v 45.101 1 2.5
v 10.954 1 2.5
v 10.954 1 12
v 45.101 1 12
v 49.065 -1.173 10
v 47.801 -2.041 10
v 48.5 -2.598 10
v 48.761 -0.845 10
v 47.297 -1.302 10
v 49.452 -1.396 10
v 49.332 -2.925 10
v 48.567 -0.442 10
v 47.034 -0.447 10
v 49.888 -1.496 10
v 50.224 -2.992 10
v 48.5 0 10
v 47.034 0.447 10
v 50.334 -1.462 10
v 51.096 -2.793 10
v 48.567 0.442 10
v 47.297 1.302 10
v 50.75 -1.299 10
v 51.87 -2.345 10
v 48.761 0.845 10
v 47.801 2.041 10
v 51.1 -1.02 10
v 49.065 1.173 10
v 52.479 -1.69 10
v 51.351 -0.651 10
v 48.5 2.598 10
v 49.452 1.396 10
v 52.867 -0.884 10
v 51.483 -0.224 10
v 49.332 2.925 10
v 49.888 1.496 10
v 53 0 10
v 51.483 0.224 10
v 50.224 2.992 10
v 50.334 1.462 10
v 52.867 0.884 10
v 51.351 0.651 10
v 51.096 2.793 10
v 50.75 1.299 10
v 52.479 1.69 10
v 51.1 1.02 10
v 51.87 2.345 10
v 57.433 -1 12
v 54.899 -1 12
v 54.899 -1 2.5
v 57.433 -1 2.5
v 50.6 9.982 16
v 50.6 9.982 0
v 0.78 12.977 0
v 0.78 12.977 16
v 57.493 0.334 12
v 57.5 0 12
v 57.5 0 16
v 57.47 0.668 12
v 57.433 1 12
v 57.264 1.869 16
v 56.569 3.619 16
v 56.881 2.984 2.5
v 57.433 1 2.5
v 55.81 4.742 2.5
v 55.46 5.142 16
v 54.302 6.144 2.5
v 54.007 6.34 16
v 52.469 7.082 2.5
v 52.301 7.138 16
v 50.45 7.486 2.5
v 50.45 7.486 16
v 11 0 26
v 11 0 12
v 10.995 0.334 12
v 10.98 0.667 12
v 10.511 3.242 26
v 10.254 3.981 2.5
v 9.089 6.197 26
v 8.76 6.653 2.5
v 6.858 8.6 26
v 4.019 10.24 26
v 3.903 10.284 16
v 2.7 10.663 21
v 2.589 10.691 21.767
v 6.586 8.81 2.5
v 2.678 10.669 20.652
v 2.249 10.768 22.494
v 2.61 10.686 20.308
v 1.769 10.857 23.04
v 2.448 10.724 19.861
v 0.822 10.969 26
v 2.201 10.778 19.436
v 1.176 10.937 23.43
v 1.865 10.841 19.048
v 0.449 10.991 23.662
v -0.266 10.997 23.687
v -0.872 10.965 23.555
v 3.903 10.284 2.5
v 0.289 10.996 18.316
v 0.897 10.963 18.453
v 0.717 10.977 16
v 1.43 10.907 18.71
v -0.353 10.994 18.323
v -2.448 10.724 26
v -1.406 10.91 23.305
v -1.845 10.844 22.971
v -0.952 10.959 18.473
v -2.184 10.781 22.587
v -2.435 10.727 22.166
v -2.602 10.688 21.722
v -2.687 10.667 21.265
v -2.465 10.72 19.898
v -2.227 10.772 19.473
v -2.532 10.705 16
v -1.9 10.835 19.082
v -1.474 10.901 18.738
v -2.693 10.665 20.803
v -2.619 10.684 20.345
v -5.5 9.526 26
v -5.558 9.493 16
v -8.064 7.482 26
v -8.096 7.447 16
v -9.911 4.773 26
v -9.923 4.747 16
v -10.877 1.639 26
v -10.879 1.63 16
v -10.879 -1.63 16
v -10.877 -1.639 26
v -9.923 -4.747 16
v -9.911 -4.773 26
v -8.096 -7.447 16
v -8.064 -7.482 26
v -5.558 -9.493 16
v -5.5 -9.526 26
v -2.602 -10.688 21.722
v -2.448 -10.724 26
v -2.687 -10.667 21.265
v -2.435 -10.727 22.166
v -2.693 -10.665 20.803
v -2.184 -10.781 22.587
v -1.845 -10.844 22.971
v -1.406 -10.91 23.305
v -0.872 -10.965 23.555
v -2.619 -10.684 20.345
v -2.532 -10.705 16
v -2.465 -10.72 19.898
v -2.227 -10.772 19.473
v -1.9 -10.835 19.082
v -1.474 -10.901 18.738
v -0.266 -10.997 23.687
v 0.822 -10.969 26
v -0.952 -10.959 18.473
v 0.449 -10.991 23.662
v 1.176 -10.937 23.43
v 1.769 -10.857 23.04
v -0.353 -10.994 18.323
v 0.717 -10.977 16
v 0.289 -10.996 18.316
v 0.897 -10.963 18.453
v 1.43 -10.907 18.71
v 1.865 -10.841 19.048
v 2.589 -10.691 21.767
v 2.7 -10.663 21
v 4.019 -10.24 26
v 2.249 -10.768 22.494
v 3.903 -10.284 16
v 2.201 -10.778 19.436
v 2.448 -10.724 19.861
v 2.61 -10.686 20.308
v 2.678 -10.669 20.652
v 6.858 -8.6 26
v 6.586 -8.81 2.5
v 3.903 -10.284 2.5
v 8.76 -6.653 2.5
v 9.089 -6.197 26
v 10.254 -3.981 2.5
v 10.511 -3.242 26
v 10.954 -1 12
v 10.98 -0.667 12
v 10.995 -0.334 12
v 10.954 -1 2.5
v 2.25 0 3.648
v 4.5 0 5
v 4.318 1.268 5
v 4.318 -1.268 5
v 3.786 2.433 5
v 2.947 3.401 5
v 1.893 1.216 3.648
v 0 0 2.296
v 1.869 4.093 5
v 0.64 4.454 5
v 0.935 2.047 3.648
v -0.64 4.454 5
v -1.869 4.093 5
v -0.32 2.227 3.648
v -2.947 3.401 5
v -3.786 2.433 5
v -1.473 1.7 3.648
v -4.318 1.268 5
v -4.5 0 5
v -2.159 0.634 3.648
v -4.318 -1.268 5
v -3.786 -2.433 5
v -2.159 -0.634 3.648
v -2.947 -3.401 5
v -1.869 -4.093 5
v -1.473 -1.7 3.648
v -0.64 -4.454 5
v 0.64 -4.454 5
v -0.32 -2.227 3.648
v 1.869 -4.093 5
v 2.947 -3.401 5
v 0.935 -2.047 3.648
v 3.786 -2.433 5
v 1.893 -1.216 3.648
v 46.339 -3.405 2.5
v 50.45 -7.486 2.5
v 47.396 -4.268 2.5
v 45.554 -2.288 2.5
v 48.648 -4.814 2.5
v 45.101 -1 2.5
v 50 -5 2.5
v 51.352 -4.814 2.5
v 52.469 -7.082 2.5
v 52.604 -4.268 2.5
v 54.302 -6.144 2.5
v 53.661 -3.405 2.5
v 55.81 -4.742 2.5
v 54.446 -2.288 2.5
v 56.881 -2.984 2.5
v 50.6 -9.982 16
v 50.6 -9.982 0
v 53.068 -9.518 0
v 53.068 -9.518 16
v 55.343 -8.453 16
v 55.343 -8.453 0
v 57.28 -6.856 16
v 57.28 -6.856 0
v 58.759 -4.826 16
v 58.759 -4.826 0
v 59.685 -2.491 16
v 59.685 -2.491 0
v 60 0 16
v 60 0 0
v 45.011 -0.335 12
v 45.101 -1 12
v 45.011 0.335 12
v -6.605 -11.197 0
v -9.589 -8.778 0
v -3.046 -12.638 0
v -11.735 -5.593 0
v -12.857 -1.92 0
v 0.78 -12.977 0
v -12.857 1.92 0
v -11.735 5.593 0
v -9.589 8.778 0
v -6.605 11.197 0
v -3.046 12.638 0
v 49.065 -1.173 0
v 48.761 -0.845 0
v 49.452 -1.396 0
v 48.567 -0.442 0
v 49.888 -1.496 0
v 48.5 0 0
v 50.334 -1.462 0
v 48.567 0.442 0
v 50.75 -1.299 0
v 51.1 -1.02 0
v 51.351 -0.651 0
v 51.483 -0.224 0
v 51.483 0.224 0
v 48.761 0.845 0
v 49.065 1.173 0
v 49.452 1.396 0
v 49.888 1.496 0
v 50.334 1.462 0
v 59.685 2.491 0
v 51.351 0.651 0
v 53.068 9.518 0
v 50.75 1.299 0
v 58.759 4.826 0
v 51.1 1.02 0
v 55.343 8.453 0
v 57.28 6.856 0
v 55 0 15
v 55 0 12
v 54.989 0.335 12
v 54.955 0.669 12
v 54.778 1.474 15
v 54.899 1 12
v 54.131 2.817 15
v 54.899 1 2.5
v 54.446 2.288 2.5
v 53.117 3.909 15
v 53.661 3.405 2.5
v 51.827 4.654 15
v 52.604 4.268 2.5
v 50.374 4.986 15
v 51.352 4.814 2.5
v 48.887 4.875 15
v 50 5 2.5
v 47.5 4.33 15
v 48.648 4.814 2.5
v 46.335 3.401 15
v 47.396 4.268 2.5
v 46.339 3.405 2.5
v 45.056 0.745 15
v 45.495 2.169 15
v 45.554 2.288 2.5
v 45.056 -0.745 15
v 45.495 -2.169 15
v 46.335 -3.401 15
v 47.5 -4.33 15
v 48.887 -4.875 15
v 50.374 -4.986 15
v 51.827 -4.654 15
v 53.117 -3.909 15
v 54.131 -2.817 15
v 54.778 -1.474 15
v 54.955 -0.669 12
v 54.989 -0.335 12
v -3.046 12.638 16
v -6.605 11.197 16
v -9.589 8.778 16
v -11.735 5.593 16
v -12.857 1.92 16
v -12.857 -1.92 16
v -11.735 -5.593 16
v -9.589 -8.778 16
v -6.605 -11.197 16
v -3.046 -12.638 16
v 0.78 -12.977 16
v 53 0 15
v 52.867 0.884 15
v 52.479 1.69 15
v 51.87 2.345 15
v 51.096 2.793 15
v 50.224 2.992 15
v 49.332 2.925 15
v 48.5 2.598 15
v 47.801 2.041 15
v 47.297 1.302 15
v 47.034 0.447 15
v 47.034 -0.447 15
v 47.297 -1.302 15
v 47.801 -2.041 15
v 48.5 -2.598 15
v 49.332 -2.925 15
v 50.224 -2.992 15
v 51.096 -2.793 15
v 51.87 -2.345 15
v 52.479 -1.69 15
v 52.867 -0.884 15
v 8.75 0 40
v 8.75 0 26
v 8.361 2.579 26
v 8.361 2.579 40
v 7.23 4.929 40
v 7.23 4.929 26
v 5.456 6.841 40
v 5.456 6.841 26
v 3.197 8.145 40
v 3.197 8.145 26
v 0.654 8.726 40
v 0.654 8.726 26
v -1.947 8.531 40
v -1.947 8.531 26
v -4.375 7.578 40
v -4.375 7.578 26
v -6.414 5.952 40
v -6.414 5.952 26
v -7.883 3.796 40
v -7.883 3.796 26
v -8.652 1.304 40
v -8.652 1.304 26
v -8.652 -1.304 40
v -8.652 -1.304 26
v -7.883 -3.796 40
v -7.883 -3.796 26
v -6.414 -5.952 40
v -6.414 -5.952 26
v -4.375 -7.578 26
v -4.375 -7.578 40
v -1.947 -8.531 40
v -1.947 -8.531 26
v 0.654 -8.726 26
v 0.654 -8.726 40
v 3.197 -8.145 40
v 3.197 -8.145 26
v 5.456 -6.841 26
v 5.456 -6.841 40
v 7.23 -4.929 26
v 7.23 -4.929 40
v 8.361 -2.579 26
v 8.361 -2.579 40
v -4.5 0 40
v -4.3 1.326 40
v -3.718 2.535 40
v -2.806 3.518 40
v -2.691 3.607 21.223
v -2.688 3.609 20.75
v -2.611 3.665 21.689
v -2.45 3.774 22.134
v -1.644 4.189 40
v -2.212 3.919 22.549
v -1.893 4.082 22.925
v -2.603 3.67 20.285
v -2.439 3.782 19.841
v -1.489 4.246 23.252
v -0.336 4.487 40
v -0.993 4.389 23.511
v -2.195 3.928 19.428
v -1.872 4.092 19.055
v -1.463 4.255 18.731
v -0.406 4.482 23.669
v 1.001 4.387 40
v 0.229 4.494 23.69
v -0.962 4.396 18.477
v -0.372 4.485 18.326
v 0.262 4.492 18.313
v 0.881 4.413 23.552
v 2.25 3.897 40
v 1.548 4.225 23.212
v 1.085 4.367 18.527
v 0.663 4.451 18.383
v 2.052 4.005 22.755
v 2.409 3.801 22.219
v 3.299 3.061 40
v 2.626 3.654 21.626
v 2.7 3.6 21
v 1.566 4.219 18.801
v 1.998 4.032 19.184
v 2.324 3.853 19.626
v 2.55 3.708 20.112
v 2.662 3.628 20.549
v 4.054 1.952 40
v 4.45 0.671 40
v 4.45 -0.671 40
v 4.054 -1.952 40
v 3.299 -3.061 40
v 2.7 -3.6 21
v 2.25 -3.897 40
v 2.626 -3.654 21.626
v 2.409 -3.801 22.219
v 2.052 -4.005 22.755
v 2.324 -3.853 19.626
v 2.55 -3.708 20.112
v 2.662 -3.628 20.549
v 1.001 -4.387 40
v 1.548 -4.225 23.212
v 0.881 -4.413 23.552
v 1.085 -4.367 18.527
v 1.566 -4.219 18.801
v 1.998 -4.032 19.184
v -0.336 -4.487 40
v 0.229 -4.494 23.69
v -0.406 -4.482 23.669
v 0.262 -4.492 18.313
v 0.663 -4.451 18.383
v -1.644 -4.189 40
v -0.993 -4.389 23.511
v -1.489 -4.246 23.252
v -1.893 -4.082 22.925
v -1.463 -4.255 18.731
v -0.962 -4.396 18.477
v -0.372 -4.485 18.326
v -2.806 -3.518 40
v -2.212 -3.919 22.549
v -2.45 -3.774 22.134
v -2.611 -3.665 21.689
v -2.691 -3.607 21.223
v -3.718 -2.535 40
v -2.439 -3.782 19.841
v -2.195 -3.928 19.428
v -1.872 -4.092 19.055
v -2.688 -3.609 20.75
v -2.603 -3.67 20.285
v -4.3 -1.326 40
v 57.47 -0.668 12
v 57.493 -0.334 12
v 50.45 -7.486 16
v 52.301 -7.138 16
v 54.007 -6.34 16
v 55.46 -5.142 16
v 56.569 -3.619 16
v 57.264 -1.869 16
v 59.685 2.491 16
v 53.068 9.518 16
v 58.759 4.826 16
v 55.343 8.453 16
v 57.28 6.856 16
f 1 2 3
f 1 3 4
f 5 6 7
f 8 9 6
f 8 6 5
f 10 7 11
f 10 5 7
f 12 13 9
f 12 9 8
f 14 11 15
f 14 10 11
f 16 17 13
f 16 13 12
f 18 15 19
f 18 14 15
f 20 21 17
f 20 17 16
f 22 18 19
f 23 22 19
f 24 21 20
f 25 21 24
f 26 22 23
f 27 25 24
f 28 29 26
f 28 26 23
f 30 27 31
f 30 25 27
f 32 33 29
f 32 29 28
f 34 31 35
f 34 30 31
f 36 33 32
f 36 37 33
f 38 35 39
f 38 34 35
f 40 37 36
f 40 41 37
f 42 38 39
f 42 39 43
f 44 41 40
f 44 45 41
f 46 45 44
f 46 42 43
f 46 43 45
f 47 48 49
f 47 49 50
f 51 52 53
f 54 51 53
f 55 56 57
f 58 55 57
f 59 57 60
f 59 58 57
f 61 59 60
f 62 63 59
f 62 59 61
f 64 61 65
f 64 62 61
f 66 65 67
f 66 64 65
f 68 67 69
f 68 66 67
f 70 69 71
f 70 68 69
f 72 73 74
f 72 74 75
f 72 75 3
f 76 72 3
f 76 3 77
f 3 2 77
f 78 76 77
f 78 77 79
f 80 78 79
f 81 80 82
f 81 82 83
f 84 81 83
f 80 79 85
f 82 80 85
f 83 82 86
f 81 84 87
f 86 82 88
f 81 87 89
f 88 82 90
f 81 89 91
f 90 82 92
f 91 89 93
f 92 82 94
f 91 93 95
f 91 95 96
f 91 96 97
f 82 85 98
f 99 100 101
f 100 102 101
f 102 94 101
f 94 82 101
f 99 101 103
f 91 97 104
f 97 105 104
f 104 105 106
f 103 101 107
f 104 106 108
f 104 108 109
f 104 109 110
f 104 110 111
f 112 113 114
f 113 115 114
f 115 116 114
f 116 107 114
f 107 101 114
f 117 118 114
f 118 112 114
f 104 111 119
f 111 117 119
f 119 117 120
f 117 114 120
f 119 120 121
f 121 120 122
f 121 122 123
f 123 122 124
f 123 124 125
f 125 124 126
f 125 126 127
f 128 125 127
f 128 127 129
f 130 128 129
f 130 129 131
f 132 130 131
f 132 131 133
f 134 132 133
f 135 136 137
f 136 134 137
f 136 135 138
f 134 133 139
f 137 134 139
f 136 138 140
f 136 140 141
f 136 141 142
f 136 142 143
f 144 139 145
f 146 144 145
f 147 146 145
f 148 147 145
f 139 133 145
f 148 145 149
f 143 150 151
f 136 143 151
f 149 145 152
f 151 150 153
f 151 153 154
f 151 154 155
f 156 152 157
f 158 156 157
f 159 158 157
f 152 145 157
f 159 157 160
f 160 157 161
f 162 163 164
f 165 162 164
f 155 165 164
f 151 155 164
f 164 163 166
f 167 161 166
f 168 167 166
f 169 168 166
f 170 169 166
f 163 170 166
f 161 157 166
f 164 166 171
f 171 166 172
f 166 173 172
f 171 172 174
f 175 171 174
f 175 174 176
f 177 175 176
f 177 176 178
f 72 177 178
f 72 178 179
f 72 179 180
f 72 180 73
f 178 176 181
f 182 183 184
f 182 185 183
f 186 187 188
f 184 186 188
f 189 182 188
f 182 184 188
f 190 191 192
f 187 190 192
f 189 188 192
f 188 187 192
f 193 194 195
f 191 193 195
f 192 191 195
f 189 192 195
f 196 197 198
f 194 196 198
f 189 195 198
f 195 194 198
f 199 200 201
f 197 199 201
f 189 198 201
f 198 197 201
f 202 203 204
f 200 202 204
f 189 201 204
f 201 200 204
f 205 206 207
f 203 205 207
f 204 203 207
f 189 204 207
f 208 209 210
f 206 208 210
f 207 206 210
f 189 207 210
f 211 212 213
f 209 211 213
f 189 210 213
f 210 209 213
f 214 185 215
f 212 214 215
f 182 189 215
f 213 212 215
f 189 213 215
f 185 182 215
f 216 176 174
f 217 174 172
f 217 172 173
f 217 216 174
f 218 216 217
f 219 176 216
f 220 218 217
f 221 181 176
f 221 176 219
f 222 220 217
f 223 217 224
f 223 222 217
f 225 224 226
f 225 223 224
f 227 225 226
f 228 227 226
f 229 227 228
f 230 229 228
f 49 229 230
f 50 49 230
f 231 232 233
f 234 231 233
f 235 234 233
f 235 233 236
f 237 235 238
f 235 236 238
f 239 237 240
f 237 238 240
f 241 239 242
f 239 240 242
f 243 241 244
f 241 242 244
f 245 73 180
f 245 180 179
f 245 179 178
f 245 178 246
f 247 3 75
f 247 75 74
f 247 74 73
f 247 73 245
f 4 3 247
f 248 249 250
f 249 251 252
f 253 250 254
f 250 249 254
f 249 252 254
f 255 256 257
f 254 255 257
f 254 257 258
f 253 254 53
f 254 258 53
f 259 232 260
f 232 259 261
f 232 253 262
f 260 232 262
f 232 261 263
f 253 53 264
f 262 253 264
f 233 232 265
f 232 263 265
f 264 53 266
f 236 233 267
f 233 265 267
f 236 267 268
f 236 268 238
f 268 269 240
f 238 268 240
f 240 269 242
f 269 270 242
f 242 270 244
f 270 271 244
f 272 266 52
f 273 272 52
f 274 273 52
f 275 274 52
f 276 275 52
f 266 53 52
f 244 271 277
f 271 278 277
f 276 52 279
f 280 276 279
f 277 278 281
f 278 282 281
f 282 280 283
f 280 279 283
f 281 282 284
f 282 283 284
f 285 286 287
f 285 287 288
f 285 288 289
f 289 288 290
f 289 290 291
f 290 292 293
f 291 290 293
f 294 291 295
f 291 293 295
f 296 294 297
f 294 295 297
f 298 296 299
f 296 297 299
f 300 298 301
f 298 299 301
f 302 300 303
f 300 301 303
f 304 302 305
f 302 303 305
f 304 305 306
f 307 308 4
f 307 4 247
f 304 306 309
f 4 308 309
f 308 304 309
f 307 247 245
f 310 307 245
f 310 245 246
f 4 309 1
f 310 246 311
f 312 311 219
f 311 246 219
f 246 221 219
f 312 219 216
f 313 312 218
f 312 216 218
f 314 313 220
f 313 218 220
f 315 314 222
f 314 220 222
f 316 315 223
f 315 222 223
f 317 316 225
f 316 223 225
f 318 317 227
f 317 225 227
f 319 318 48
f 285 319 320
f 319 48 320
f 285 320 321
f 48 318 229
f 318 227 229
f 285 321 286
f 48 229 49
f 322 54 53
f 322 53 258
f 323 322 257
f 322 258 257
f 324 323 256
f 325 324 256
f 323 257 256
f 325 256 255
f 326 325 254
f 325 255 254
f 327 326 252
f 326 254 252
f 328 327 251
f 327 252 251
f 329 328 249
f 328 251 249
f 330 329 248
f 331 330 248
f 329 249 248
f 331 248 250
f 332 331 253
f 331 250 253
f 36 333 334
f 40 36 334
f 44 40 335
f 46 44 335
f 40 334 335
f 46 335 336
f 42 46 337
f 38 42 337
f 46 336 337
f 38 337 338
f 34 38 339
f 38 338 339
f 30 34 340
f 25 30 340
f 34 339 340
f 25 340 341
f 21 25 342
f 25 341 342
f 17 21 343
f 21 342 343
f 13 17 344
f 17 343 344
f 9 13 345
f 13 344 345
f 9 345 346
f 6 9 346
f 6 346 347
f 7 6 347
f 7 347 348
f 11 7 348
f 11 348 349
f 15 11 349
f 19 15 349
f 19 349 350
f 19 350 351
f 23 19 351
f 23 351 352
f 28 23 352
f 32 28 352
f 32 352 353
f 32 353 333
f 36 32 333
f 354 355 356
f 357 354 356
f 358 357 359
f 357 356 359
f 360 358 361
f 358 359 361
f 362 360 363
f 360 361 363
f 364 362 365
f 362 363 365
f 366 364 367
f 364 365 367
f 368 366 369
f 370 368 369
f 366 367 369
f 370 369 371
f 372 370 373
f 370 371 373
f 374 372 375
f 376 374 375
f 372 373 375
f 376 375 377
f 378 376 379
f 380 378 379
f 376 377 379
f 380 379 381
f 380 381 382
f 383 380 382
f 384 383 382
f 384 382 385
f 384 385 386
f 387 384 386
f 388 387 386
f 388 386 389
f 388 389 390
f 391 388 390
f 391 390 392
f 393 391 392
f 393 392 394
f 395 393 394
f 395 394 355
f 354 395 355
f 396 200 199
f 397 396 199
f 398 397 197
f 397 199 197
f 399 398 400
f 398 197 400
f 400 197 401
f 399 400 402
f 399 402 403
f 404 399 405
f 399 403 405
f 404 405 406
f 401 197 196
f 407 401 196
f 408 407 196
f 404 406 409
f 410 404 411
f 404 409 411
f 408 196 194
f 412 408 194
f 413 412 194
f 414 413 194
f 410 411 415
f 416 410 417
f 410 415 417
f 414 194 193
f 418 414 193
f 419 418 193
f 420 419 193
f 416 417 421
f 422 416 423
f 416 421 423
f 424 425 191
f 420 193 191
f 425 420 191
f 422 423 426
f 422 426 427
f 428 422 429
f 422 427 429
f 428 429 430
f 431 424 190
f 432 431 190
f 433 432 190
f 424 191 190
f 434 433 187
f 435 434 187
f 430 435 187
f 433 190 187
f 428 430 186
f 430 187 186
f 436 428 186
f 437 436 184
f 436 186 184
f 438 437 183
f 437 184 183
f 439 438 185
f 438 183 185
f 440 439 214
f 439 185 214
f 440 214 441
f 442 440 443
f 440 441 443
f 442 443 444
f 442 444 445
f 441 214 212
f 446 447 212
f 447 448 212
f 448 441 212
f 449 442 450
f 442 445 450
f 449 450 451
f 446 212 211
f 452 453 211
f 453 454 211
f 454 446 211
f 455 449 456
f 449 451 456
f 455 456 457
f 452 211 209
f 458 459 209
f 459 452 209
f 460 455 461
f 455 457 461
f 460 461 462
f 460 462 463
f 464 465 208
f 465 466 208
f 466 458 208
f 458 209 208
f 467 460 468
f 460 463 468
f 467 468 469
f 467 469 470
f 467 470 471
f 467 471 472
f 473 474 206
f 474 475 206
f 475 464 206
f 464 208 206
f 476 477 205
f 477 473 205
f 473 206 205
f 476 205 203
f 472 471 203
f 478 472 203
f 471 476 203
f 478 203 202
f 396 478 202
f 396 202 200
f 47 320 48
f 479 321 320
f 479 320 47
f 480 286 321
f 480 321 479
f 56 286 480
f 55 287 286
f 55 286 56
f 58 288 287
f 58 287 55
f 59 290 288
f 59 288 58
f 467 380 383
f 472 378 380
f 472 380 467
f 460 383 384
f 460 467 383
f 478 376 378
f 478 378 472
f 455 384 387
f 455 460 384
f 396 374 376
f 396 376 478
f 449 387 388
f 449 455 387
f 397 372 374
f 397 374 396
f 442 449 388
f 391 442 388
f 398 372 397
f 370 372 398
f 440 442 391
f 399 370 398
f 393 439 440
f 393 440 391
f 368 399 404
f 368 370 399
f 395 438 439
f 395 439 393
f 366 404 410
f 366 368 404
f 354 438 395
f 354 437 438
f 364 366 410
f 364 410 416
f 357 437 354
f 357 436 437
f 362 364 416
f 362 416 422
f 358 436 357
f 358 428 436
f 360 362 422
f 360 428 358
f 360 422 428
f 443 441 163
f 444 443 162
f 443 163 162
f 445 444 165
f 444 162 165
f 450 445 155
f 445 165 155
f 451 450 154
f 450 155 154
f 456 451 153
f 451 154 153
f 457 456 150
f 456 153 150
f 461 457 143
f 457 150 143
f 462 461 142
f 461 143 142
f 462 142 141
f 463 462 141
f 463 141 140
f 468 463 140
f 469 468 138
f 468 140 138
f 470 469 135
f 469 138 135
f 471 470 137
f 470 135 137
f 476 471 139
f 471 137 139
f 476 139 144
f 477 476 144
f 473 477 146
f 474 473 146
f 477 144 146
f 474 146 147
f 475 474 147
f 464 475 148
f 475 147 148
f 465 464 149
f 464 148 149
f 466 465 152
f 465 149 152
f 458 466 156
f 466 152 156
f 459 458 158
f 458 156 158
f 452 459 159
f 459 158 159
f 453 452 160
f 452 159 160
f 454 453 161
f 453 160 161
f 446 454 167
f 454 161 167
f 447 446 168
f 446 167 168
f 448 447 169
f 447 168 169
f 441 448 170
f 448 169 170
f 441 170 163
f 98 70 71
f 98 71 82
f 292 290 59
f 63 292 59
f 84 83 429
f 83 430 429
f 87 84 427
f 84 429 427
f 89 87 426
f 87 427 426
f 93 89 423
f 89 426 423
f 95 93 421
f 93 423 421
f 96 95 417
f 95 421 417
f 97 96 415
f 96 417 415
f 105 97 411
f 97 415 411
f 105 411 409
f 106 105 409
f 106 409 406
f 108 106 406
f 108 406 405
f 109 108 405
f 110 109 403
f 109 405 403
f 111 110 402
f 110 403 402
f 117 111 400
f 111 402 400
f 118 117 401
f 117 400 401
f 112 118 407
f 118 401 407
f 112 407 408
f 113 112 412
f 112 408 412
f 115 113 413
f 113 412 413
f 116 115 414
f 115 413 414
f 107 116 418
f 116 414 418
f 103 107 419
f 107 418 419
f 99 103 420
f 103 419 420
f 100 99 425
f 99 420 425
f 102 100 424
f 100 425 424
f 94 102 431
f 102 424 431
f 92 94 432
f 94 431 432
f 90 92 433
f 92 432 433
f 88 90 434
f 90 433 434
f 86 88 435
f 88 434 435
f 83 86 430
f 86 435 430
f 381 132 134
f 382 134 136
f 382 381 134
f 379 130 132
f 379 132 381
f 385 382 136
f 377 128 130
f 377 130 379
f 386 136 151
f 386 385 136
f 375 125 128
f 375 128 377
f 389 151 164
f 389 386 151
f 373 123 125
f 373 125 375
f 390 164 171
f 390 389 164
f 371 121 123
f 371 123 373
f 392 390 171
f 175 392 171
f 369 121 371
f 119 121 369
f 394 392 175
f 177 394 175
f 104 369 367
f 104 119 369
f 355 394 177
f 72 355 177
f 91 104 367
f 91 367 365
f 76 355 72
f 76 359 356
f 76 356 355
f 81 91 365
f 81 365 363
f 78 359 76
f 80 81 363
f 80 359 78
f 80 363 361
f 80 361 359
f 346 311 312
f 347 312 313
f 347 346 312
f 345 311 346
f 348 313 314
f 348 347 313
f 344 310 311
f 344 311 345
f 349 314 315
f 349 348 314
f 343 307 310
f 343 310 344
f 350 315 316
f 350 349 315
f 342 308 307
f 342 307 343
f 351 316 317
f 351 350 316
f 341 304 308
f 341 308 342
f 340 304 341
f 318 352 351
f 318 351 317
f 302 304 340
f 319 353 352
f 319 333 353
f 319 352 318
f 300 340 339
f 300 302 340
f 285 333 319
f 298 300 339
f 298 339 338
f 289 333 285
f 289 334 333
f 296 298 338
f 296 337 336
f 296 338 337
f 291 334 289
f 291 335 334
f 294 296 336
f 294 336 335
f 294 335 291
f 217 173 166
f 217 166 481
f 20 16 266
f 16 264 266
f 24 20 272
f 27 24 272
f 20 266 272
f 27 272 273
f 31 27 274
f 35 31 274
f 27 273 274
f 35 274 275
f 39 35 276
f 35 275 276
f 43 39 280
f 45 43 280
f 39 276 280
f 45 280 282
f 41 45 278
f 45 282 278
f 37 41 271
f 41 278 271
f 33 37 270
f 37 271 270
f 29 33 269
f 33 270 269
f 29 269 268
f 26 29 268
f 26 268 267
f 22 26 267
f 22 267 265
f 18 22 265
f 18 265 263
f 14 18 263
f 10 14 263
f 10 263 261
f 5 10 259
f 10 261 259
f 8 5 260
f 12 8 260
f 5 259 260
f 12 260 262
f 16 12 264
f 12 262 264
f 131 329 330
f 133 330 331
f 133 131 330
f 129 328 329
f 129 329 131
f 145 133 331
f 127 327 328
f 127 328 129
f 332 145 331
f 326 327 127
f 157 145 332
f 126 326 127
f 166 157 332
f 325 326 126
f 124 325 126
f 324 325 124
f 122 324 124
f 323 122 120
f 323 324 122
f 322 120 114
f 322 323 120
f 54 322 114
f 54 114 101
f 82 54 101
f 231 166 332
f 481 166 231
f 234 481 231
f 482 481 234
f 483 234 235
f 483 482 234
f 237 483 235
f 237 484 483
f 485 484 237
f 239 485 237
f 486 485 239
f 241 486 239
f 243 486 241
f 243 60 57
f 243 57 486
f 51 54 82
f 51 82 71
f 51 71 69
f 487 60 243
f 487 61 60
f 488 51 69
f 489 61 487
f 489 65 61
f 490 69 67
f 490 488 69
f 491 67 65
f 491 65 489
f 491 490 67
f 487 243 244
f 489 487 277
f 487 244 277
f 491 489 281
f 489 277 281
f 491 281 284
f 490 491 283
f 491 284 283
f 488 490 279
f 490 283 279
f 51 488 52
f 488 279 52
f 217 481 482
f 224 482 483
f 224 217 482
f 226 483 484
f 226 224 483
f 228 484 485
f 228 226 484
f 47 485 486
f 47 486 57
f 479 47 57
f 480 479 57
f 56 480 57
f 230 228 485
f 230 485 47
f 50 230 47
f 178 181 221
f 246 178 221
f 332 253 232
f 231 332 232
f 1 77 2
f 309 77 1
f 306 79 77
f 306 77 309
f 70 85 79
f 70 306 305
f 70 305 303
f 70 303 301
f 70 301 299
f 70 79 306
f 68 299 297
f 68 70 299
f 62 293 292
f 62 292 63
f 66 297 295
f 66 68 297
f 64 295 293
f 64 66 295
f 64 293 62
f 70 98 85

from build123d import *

# Parameters (mm, degrees)
F1_DEPTH        = 16
F2_T            = -2.5
F3_W            = 70
F3_H            = 2
F4_DEPTH        = 12
F6_R            = 11
F7_DEPTH        = 26
F5_R            = 5
F9_DEPTH        = 15
F8_R            = 8.75
F10_DEPTH       = 40
F12_D           = 9
F12_DEPTH       = 35
F12_TIP         = 2.7038727856
F13_R           = 2.7
F14_DEPTH       = 12.5
F16_D           = 3
F16_START       = 1
F16_CBORE_D     = 6
F16_CBORE_DEPTH = 5


with BuildPart() as f1:
    # F0 (on Top) → F1 (new body)
    with BuildSketch(Plane.XY):
        with BuildLine():
            ThreePointArc((0.78, -12.976578902), (9.4641428561, -8.9123509805), (13, 0))
            ThreePointArc((13, 0), (9.4641428561, 8.9123509805), (0.78, 12.976578902))
            ThreePointArc((0.78, 12.976578902), (-13, 0), (0.78, -12.976578902))
        make_face()
        with BuildLine():
            ThreePointArc((0.78, 12.976578902), (9.4641428561, 8.9123509805), (13, 0))
            ThreePointArc((13, 0), (9.4641428561, -8.9123509805), (0.78, -12.976578902))
            Line((0.78, -12.976578902), (50.6, -9.9819837708))
            ThreePointArc((50.6, -9.9819837708), (40, 0), (50.6, 9.9819837708))
            Line((50.6, 9.9819837708), (0.78, 12.976578902))
        make_face()
        with BuildLine():
            ThreePointArc((60, 0), (57.2801098893, 6.8556546004), (50.6, 9.9819837708))
            ThreePointArc((50.6, 9.9819837708), (40, 0), (50.6, -9.9819837708))
            ThreePointArc((50.6, -9.9819837708), (57.2801098893, -6.8556546004), (60, 0))
        make_face()
    extrude(amount=F1_DEPTH)

    # F2
    f2_openings = [f1.faces().sort_by_distance(p)[0] for p in [
        (21.977423, 0, 16),
    ]]
    offset(amount=F2_T, openings=f2_openings)

    # F3 (on Top) → F4 (join)
    with BuildSketch(Plane.XY):
        with Locations((23, 0)):
            Rectangle(F3_W, F3_H)
    extrude(amount=F4_DEPTH)

    # F6 (on Top) → F7 (join)
    with BuildSketch(Plane.XY):
        Circle(F6_R)
    extrude(amount=F7_DEPTH)

    # F5 (on Top) → F9 (join)
    with BuildSketch(Plane.XY):
        with Locations((50, 0)):
            Circle(F5_R)
    extrude(amount=F9_DEPTH)

    # F8 (on Top) → F10 (join)
    with BuildSketch(Plane.XY):
        Circle(F8_R)
    extrude(amount=F10_DEPTH)

    # F12
    with Locations(Plane.XY.offset(40)):
        with Locations((0, 0)):
            Hole(F12_D / 2, depth=F12_DEPTH)
            with Locations((0, 0, -(F12_DEPTH + F12_TIP / 2))):  # 118° drill point
                Cone(0, F12_D / 2, F12_TIP, mode=Mode.SUBTRACT)

    # F13 (on Front) → F14 (cut, symmetric)
    with BuildSketch(Plane.XZ):
        with Locations((0, 21)):
            Circle(F13_R)
    extrude(amount=F14_DEPTH, both=True, mode=Mode.SUBTRACT)

    # F16 (through all)
    # its depths count from where the whole tool has entered the part; down to there all is cleared
    with Locations(Plane.XY.offset(16).offset(-F16_START)):
        with Locations((50, 0)):
            CounterBoreHole(F16_D / 2, F16_CBORE_D / 2, F16_CBORE_DEPTH)


solid = f1.part
